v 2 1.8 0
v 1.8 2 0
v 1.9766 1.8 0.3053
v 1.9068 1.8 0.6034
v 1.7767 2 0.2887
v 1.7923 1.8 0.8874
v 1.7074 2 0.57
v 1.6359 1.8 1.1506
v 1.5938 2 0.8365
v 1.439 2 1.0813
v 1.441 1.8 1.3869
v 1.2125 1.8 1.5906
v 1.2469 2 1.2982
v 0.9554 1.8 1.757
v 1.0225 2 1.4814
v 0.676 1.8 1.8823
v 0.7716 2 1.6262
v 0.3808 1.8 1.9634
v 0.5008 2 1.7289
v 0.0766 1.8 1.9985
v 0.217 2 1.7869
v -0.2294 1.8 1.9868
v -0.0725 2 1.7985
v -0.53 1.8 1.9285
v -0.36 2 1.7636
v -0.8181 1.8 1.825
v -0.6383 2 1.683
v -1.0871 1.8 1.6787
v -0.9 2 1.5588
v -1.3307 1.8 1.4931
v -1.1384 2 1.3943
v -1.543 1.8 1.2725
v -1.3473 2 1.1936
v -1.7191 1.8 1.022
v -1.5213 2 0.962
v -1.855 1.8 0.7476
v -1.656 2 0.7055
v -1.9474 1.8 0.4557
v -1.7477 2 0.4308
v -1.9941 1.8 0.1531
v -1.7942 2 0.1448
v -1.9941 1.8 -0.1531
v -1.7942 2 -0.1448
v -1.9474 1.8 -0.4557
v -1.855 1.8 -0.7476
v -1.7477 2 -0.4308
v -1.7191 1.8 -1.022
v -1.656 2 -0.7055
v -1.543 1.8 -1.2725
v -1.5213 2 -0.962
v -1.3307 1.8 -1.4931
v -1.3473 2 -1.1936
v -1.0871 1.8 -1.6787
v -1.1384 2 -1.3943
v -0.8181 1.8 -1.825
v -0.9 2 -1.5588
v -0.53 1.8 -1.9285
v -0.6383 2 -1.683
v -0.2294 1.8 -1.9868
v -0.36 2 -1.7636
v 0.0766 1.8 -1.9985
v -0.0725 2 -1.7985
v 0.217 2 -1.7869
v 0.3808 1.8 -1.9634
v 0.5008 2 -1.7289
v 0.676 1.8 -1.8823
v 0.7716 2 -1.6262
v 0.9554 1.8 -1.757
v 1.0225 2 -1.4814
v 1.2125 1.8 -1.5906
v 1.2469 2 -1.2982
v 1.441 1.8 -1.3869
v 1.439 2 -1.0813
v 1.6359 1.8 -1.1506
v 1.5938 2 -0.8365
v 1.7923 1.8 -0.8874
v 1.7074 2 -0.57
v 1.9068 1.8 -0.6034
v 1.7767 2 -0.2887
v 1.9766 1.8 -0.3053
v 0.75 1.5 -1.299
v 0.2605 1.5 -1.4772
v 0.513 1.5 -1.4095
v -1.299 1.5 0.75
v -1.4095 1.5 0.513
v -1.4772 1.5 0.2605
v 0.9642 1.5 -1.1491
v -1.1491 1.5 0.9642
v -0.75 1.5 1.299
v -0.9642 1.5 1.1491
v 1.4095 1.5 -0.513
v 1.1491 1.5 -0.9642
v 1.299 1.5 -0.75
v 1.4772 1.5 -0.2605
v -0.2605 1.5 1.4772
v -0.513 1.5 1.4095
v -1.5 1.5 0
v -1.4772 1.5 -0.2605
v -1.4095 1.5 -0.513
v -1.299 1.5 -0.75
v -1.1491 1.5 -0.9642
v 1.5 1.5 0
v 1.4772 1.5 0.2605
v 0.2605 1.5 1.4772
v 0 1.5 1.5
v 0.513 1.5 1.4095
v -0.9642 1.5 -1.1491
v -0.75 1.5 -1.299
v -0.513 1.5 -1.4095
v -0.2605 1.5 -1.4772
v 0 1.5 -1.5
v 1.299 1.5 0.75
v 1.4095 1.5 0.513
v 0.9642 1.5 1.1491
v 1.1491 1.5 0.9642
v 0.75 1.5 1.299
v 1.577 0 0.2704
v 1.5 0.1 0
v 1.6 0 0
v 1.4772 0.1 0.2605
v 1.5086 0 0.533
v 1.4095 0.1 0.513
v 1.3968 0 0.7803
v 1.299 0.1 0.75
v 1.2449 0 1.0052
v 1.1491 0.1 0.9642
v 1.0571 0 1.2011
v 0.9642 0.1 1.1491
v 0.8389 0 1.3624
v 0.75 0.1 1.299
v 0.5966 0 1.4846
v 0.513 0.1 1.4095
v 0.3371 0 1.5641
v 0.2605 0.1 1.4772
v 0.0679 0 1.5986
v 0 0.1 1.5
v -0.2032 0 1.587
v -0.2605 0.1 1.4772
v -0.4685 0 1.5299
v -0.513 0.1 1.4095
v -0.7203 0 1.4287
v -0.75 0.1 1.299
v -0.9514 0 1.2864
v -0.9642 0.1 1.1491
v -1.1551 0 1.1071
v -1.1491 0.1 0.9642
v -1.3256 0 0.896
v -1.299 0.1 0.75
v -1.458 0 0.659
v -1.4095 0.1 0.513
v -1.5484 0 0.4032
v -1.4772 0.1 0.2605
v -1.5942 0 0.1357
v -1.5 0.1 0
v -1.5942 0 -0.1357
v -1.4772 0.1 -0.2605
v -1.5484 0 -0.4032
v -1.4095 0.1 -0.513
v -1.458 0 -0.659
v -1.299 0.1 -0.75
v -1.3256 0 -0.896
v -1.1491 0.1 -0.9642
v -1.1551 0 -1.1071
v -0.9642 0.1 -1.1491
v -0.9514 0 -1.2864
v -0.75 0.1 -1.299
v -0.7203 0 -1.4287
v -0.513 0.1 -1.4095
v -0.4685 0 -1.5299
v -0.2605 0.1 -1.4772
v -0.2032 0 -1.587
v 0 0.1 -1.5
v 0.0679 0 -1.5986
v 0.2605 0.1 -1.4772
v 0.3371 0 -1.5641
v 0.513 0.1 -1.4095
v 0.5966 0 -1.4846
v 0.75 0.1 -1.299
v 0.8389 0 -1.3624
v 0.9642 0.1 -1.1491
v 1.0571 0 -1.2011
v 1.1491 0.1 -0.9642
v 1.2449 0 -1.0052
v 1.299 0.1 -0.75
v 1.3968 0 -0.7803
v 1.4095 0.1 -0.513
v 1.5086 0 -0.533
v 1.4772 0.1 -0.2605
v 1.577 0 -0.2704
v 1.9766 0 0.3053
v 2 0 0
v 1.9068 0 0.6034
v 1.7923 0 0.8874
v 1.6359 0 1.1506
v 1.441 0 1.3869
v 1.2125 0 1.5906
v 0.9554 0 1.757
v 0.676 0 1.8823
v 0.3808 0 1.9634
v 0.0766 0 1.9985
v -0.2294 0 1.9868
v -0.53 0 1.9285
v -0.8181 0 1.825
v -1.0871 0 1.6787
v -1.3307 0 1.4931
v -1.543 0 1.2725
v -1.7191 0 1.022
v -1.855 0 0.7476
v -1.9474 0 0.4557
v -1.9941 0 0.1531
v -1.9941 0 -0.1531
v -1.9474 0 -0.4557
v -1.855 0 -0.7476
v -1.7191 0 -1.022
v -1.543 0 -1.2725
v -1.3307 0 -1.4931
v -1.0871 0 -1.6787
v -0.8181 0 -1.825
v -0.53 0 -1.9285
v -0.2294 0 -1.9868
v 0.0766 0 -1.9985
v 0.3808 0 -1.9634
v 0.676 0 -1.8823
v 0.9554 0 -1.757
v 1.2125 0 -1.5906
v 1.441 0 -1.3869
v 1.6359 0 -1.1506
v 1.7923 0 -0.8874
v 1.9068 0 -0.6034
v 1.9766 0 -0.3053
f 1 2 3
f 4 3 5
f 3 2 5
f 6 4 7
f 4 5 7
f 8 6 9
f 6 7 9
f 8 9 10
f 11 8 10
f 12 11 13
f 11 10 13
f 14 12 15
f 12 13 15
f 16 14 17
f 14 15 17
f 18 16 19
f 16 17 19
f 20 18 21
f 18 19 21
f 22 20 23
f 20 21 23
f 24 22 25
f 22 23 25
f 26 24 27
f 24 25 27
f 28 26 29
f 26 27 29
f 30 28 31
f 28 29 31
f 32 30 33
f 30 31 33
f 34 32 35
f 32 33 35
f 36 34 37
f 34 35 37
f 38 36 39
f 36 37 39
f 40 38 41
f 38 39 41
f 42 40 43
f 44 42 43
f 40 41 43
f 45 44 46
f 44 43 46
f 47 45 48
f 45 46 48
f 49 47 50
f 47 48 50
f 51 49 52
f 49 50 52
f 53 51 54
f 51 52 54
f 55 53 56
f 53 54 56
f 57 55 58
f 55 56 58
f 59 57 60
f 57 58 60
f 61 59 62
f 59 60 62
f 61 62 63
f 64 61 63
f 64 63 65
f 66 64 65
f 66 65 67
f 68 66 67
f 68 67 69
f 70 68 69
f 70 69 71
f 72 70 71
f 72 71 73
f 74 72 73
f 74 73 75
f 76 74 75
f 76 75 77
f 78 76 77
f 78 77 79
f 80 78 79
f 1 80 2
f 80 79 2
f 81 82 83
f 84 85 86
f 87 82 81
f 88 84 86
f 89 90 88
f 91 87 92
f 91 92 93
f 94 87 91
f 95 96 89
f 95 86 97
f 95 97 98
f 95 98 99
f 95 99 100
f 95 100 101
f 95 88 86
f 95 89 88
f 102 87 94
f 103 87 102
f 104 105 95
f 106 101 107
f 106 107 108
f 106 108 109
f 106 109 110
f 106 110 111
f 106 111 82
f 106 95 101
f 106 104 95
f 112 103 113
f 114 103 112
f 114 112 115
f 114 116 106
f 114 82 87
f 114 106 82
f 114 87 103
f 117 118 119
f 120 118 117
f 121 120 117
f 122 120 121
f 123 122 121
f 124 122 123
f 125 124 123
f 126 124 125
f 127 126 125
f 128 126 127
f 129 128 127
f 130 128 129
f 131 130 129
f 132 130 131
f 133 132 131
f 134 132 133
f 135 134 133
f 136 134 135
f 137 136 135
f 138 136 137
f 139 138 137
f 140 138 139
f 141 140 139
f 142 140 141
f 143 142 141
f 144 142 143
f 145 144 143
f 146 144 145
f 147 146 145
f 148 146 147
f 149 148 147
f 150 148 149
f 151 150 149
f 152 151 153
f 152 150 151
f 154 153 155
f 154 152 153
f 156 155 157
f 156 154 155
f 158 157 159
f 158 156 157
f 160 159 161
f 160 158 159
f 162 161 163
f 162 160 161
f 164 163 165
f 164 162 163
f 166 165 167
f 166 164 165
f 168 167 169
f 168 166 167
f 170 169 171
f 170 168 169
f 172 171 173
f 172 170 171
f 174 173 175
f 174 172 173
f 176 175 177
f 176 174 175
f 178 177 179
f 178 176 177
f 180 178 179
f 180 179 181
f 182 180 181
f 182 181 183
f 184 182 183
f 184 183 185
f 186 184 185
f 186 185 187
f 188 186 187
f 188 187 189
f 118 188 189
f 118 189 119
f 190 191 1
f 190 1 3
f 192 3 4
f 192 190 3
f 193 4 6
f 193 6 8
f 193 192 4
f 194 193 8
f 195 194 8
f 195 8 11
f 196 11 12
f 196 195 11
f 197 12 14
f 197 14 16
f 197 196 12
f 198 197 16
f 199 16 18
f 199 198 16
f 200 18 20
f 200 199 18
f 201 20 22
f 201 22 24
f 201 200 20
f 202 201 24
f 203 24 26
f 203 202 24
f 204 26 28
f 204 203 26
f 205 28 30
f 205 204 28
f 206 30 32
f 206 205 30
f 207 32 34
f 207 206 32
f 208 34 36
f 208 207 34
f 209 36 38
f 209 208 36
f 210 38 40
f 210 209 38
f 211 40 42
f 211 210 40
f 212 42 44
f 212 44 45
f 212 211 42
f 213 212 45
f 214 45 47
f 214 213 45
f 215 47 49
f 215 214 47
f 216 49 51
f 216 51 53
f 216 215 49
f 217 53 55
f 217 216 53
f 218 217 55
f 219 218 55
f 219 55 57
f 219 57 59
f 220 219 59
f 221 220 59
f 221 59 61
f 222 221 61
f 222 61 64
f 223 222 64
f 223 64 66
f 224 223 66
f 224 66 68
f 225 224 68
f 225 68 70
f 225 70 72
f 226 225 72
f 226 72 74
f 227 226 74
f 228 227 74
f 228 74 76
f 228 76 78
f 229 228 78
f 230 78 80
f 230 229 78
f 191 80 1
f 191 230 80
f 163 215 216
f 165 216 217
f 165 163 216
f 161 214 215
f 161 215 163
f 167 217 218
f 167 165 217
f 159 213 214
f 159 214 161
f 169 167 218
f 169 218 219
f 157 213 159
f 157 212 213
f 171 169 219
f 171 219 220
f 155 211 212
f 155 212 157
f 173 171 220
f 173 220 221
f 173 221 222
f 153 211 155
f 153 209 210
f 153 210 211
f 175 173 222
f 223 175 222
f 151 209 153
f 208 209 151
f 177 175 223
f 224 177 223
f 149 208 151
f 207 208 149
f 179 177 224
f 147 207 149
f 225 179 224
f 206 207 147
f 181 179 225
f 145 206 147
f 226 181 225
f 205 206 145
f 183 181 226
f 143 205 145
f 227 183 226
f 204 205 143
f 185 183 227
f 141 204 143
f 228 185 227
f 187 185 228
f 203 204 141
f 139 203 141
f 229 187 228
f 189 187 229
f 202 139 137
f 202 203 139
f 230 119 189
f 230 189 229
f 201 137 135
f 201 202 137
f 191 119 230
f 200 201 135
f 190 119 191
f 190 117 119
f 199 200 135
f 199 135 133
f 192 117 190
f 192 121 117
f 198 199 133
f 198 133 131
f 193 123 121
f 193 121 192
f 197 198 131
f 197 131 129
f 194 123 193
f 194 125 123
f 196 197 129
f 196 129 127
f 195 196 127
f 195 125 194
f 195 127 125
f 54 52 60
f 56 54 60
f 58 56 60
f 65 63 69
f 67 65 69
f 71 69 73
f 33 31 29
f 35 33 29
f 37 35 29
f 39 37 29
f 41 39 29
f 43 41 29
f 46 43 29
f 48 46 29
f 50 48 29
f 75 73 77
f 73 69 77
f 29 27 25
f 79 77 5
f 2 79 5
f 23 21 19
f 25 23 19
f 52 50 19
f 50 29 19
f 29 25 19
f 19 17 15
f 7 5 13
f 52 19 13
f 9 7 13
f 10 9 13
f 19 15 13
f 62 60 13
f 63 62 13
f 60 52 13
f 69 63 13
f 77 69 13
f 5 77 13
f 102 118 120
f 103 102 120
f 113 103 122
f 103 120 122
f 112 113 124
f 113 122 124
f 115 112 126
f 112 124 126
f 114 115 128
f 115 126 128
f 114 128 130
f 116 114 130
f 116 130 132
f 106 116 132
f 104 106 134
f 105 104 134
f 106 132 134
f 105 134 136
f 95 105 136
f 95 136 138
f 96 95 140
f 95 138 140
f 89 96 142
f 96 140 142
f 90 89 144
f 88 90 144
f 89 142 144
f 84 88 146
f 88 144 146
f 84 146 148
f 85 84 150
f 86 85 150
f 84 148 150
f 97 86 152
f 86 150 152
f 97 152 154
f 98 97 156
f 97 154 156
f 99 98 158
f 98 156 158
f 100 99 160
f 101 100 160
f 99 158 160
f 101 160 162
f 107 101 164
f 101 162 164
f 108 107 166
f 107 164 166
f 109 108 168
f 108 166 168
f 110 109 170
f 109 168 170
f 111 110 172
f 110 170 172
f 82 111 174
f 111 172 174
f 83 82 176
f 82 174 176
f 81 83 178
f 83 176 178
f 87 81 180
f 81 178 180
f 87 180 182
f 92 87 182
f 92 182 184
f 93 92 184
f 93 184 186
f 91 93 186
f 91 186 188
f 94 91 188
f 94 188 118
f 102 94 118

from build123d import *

# Parameters (mm, degrees)
SKETCH_R        = 2
PAD_DEPTH       = 2
SKETCH001_R     = 1.5
POCKET_DEPTH    = 1.5
CHAMFER_SIZE    = 0.2
CHAMFER001_SIZE = 0.1


with BuildPart() as part:
    # Sketch → Pad (new body)
    with BuildSketch(Plane.XZ):
        Circle(SKETCH_R)
    extrude(amount=-PAD_DEPTH)

    # Sketch001 → Pocket (cut)
    with BuildSketch(Plane.XZ):
        Circle(SKETCH001_R)
    extrude(amount=-POCKET_DEPTH, mode=Mode.SUBTRACT)

    # Chamfer
    chamfer_edges = [part.edges().sort_by_distance(p)[0] for p in [
        (-2, 2, 0),
    ]]
    chamfer(chamfer_edges, length=CHAMFER_SIZE)

    # Chamfer001
    chamfer001_edges = [part.edges().sort_by_distance(p)[0] for p in [
        (-1.5, 0, 0),
    ]]
    chamfer(chamfer001_edges, length=CHAMFER001_SIZE)


solid = part.part
